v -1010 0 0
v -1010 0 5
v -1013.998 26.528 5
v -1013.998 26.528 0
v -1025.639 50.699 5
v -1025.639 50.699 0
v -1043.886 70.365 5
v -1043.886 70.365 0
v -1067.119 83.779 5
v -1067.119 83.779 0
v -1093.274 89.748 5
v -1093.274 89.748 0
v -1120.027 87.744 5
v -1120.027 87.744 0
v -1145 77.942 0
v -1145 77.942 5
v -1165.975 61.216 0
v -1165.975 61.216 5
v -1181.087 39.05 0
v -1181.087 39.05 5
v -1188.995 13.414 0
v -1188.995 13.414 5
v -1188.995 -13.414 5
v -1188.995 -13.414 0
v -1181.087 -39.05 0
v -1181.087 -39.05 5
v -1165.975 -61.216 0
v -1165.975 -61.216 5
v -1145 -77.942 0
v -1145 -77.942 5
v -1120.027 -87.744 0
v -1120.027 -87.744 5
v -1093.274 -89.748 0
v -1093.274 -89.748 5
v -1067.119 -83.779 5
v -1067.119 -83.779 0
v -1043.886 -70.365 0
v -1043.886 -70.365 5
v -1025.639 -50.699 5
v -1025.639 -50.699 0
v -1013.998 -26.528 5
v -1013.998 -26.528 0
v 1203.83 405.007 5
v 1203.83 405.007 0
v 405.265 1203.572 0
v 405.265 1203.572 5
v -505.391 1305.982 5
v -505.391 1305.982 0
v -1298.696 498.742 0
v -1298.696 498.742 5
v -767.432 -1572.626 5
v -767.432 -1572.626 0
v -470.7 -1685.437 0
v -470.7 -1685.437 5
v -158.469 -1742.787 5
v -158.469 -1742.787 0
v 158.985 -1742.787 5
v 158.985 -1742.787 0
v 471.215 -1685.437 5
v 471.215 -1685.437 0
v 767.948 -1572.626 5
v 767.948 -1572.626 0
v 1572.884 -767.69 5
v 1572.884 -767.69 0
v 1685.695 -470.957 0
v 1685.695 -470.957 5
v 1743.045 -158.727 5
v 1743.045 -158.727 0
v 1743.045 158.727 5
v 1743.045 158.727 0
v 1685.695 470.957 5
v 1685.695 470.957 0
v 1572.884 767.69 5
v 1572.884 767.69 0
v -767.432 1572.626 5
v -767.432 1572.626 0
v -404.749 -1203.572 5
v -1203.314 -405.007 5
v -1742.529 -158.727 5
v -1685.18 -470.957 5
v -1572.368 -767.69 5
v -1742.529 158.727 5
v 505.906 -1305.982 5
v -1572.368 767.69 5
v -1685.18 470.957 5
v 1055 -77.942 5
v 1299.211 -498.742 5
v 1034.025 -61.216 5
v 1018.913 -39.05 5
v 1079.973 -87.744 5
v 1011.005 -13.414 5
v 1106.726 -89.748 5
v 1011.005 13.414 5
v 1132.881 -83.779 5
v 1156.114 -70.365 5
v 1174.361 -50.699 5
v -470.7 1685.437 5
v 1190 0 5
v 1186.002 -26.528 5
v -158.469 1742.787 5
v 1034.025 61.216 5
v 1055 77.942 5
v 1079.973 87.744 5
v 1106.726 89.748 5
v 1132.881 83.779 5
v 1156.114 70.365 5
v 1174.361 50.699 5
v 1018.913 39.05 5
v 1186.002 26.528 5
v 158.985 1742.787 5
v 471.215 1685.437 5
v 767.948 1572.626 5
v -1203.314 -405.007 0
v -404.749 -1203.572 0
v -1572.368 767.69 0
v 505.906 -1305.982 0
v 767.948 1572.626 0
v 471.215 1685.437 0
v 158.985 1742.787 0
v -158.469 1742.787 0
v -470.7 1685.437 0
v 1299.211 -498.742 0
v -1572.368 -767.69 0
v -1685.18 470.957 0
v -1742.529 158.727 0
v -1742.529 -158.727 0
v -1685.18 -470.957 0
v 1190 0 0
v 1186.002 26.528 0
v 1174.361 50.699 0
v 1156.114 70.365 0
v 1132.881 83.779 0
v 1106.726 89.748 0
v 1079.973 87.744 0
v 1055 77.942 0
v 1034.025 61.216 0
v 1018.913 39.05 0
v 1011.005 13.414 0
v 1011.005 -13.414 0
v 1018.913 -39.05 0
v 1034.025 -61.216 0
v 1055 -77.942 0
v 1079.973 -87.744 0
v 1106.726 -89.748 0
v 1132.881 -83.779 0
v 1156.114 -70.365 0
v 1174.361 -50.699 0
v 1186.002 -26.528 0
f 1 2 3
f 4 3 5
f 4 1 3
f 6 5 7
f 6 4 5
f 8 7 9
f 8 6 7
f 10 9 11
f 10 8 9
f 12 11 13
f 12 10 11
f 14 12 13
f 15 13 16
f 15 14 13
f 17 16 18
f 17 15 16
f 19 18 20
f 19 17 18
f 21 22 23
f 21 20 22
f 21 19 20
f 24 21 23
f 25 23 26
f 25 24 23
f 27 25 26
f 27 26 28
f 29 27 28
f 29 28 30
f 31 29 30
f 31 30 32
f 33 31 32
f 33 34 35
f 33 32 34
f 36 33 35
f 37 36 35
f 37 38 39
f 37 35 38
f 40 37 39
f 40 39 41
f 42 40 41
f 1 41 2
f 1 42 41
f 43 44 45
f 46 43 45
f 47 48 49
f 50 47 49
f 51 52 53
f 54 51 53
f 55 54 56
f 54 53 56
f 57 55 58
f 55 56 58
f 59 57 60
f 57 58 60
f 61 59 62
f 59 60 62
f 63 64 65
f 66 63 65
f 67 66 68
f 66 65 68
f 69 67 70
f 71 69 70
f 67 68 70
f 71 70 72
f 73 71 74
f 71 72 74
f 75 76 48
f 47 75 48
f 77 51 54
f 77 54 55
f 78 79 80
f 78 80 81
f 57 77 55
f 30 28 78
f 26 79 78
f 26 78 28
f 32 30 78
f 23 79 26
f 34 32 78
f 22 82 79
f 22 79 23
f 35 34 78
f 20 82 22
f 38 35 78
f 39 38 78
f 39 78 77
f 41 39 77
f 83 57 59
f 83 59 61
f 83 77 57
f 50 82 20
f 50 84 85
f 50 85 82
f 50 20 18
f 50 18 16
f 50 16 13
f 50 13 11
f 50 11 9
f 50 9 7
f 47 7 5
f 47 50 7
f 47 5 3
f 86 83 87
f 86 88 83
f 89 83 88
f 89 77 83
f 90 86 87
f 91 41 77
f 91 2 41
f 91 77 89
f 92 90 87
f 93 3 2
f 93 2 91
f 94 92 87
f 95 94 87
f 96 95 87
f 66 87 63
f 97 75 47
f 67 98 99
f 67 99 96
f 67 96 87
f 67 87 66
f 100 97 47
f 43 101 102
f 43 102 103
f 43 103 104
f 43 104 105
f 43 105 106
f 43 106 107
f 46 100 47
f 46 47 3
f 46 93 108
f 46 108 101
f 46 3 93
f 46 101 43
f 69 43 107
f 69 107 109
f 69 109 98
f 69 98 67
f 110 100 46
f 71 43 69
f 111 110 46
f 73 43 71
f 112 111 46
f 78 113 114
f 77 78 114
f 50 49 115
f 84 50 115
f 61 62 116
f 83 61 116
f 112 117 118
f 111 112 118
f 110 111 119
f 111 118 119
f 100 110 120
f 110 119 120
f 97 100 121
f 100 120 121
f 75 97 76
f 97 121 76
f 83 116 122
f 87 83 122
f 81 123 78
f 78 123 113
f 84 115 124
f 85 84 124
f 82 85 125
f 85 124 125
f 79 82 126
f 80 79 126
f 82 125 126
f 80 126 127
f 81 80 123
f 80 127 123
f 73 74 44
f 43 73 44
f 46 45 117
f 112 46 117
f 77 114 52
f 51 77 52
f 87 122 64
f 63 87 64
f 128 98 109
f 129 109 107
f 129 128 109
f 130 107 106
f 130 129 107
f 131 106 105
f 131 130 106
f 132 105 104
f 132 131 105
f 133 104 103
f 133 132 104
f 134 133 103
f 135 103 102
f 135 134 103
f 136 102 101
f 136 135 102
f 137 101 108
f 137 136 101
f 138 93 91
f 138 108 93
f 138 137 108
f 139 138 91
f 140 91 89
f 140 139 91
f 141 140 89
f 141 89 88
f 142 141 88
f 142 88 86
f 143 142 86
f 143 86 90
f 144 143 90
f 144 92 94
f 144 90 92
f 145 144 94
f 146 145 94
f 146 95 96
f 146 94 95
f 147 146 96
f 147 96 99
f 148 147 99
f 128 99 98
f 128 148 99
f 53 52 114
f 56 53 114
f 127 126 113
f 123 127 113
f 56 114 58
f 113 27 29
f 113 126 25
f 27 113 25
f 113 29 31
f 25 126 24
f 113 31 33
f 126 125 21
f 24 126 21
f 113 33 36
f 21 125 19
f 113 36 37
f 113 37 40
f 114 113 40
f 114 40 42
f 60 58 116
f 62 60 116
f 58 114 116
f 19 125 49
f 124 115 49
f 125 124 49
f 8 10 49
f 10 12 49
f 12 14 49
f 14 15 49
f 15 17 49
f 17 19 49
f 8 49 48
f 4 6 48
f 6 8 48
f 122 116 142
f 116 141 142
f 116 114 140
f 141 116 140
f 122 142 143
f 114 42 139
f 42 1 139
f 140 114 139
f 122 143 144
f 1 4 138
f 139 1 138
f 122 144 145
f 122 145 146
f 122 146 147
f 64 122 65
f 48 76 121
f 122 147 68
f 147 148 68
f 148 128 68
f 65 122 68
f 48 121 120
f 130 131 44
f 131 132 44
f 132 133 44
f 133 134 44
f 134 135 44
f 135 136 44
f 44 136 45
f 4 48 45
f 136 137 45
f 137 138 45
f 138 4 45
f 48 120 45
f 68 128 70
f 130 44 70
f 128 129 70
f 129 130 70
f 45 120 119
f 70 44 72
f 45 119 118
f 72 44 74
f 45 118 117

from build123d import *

# Parameters (mm, degrees)
BOSS_EXTRUDE1_DEPTH = 5
SKETCH3_R           = 90
CUT_EXTRUDE3_DEPTH  = 10


with BuildPart() as part:
    # Sketch2 → Boss-Extrude1 (new body)
    with BuildSketch(Plane.XY):
        with BuildLine():
            Line((767.947915583, -1572.625771149), (505.906479137, -1305.981517926))
            Line((505.906479137, -1305.981517926), (1299.211324809, -498.742094189))
            Line((1299.211324809, -498.742094189), (1572.883525326, -767.690161406))
            ThreePointArc((1572.883525326, -767.690161406), (1750.257754177, 0), (1572.883525326, 767.690161406))
            Line((1572.883525326, 767.690161406), (1203.829573729, 405.006824211))
            Line((1203.829573729, 405.006824211), (405.264578388, 1203.571819552))
            Line((405.264578388, 1203.571819552), (767.947915583, 1572.625771149))
            ThreePointArc((767.947915583, 1572.625771149), (0.257754177, 1750), (-767.432407229, 1572.625771149))
            Line((-767.432407229, 1572.625771149), (-505.390970783, 1305.981517926))
            Line((-505.390970783, 1305.981517926), (-1298.695816455, 498.742094189))
            Line((-1298.695816455, 498.742094189), (-1572.368016972, 767.690161406))
            ThreePointArc((-1572.368016972, 767.690161406), (-1749.742245823, 0), (-1572.368016972, -767.690161406))
            Line((-1572.368016972, -767.690161406), (-1203.314065375, -405.006824211))
            Line((-1203.314065375, -405.006824211), (-404.749070034, -1203.571819552))
            Line((-404.749070034, -1203.571819552), (-767.432407229, -1572.625771149))
            ThreePointArc((-767.432407229, -1572.625771149), (0.257754177, -1750), (767.947915583, -1572.625771149))
        make_face()
    extrude(amount=BOSS_EXTRUDE1_DEPTH)

    # Sketch3 → Cut-Extrude3 (cut)
    with BuildSketch(Plane.XY):
        with Locations((-1100, 0)):
            Circle(SKETCH3_R)
        with Locations((1100, 0)):
            Circle(SKETCH3_R)
    extrude(amount=CUT_EXTRUDE3_DEPTH, mode=Mode.SUBTRACT)


solid = part.part
